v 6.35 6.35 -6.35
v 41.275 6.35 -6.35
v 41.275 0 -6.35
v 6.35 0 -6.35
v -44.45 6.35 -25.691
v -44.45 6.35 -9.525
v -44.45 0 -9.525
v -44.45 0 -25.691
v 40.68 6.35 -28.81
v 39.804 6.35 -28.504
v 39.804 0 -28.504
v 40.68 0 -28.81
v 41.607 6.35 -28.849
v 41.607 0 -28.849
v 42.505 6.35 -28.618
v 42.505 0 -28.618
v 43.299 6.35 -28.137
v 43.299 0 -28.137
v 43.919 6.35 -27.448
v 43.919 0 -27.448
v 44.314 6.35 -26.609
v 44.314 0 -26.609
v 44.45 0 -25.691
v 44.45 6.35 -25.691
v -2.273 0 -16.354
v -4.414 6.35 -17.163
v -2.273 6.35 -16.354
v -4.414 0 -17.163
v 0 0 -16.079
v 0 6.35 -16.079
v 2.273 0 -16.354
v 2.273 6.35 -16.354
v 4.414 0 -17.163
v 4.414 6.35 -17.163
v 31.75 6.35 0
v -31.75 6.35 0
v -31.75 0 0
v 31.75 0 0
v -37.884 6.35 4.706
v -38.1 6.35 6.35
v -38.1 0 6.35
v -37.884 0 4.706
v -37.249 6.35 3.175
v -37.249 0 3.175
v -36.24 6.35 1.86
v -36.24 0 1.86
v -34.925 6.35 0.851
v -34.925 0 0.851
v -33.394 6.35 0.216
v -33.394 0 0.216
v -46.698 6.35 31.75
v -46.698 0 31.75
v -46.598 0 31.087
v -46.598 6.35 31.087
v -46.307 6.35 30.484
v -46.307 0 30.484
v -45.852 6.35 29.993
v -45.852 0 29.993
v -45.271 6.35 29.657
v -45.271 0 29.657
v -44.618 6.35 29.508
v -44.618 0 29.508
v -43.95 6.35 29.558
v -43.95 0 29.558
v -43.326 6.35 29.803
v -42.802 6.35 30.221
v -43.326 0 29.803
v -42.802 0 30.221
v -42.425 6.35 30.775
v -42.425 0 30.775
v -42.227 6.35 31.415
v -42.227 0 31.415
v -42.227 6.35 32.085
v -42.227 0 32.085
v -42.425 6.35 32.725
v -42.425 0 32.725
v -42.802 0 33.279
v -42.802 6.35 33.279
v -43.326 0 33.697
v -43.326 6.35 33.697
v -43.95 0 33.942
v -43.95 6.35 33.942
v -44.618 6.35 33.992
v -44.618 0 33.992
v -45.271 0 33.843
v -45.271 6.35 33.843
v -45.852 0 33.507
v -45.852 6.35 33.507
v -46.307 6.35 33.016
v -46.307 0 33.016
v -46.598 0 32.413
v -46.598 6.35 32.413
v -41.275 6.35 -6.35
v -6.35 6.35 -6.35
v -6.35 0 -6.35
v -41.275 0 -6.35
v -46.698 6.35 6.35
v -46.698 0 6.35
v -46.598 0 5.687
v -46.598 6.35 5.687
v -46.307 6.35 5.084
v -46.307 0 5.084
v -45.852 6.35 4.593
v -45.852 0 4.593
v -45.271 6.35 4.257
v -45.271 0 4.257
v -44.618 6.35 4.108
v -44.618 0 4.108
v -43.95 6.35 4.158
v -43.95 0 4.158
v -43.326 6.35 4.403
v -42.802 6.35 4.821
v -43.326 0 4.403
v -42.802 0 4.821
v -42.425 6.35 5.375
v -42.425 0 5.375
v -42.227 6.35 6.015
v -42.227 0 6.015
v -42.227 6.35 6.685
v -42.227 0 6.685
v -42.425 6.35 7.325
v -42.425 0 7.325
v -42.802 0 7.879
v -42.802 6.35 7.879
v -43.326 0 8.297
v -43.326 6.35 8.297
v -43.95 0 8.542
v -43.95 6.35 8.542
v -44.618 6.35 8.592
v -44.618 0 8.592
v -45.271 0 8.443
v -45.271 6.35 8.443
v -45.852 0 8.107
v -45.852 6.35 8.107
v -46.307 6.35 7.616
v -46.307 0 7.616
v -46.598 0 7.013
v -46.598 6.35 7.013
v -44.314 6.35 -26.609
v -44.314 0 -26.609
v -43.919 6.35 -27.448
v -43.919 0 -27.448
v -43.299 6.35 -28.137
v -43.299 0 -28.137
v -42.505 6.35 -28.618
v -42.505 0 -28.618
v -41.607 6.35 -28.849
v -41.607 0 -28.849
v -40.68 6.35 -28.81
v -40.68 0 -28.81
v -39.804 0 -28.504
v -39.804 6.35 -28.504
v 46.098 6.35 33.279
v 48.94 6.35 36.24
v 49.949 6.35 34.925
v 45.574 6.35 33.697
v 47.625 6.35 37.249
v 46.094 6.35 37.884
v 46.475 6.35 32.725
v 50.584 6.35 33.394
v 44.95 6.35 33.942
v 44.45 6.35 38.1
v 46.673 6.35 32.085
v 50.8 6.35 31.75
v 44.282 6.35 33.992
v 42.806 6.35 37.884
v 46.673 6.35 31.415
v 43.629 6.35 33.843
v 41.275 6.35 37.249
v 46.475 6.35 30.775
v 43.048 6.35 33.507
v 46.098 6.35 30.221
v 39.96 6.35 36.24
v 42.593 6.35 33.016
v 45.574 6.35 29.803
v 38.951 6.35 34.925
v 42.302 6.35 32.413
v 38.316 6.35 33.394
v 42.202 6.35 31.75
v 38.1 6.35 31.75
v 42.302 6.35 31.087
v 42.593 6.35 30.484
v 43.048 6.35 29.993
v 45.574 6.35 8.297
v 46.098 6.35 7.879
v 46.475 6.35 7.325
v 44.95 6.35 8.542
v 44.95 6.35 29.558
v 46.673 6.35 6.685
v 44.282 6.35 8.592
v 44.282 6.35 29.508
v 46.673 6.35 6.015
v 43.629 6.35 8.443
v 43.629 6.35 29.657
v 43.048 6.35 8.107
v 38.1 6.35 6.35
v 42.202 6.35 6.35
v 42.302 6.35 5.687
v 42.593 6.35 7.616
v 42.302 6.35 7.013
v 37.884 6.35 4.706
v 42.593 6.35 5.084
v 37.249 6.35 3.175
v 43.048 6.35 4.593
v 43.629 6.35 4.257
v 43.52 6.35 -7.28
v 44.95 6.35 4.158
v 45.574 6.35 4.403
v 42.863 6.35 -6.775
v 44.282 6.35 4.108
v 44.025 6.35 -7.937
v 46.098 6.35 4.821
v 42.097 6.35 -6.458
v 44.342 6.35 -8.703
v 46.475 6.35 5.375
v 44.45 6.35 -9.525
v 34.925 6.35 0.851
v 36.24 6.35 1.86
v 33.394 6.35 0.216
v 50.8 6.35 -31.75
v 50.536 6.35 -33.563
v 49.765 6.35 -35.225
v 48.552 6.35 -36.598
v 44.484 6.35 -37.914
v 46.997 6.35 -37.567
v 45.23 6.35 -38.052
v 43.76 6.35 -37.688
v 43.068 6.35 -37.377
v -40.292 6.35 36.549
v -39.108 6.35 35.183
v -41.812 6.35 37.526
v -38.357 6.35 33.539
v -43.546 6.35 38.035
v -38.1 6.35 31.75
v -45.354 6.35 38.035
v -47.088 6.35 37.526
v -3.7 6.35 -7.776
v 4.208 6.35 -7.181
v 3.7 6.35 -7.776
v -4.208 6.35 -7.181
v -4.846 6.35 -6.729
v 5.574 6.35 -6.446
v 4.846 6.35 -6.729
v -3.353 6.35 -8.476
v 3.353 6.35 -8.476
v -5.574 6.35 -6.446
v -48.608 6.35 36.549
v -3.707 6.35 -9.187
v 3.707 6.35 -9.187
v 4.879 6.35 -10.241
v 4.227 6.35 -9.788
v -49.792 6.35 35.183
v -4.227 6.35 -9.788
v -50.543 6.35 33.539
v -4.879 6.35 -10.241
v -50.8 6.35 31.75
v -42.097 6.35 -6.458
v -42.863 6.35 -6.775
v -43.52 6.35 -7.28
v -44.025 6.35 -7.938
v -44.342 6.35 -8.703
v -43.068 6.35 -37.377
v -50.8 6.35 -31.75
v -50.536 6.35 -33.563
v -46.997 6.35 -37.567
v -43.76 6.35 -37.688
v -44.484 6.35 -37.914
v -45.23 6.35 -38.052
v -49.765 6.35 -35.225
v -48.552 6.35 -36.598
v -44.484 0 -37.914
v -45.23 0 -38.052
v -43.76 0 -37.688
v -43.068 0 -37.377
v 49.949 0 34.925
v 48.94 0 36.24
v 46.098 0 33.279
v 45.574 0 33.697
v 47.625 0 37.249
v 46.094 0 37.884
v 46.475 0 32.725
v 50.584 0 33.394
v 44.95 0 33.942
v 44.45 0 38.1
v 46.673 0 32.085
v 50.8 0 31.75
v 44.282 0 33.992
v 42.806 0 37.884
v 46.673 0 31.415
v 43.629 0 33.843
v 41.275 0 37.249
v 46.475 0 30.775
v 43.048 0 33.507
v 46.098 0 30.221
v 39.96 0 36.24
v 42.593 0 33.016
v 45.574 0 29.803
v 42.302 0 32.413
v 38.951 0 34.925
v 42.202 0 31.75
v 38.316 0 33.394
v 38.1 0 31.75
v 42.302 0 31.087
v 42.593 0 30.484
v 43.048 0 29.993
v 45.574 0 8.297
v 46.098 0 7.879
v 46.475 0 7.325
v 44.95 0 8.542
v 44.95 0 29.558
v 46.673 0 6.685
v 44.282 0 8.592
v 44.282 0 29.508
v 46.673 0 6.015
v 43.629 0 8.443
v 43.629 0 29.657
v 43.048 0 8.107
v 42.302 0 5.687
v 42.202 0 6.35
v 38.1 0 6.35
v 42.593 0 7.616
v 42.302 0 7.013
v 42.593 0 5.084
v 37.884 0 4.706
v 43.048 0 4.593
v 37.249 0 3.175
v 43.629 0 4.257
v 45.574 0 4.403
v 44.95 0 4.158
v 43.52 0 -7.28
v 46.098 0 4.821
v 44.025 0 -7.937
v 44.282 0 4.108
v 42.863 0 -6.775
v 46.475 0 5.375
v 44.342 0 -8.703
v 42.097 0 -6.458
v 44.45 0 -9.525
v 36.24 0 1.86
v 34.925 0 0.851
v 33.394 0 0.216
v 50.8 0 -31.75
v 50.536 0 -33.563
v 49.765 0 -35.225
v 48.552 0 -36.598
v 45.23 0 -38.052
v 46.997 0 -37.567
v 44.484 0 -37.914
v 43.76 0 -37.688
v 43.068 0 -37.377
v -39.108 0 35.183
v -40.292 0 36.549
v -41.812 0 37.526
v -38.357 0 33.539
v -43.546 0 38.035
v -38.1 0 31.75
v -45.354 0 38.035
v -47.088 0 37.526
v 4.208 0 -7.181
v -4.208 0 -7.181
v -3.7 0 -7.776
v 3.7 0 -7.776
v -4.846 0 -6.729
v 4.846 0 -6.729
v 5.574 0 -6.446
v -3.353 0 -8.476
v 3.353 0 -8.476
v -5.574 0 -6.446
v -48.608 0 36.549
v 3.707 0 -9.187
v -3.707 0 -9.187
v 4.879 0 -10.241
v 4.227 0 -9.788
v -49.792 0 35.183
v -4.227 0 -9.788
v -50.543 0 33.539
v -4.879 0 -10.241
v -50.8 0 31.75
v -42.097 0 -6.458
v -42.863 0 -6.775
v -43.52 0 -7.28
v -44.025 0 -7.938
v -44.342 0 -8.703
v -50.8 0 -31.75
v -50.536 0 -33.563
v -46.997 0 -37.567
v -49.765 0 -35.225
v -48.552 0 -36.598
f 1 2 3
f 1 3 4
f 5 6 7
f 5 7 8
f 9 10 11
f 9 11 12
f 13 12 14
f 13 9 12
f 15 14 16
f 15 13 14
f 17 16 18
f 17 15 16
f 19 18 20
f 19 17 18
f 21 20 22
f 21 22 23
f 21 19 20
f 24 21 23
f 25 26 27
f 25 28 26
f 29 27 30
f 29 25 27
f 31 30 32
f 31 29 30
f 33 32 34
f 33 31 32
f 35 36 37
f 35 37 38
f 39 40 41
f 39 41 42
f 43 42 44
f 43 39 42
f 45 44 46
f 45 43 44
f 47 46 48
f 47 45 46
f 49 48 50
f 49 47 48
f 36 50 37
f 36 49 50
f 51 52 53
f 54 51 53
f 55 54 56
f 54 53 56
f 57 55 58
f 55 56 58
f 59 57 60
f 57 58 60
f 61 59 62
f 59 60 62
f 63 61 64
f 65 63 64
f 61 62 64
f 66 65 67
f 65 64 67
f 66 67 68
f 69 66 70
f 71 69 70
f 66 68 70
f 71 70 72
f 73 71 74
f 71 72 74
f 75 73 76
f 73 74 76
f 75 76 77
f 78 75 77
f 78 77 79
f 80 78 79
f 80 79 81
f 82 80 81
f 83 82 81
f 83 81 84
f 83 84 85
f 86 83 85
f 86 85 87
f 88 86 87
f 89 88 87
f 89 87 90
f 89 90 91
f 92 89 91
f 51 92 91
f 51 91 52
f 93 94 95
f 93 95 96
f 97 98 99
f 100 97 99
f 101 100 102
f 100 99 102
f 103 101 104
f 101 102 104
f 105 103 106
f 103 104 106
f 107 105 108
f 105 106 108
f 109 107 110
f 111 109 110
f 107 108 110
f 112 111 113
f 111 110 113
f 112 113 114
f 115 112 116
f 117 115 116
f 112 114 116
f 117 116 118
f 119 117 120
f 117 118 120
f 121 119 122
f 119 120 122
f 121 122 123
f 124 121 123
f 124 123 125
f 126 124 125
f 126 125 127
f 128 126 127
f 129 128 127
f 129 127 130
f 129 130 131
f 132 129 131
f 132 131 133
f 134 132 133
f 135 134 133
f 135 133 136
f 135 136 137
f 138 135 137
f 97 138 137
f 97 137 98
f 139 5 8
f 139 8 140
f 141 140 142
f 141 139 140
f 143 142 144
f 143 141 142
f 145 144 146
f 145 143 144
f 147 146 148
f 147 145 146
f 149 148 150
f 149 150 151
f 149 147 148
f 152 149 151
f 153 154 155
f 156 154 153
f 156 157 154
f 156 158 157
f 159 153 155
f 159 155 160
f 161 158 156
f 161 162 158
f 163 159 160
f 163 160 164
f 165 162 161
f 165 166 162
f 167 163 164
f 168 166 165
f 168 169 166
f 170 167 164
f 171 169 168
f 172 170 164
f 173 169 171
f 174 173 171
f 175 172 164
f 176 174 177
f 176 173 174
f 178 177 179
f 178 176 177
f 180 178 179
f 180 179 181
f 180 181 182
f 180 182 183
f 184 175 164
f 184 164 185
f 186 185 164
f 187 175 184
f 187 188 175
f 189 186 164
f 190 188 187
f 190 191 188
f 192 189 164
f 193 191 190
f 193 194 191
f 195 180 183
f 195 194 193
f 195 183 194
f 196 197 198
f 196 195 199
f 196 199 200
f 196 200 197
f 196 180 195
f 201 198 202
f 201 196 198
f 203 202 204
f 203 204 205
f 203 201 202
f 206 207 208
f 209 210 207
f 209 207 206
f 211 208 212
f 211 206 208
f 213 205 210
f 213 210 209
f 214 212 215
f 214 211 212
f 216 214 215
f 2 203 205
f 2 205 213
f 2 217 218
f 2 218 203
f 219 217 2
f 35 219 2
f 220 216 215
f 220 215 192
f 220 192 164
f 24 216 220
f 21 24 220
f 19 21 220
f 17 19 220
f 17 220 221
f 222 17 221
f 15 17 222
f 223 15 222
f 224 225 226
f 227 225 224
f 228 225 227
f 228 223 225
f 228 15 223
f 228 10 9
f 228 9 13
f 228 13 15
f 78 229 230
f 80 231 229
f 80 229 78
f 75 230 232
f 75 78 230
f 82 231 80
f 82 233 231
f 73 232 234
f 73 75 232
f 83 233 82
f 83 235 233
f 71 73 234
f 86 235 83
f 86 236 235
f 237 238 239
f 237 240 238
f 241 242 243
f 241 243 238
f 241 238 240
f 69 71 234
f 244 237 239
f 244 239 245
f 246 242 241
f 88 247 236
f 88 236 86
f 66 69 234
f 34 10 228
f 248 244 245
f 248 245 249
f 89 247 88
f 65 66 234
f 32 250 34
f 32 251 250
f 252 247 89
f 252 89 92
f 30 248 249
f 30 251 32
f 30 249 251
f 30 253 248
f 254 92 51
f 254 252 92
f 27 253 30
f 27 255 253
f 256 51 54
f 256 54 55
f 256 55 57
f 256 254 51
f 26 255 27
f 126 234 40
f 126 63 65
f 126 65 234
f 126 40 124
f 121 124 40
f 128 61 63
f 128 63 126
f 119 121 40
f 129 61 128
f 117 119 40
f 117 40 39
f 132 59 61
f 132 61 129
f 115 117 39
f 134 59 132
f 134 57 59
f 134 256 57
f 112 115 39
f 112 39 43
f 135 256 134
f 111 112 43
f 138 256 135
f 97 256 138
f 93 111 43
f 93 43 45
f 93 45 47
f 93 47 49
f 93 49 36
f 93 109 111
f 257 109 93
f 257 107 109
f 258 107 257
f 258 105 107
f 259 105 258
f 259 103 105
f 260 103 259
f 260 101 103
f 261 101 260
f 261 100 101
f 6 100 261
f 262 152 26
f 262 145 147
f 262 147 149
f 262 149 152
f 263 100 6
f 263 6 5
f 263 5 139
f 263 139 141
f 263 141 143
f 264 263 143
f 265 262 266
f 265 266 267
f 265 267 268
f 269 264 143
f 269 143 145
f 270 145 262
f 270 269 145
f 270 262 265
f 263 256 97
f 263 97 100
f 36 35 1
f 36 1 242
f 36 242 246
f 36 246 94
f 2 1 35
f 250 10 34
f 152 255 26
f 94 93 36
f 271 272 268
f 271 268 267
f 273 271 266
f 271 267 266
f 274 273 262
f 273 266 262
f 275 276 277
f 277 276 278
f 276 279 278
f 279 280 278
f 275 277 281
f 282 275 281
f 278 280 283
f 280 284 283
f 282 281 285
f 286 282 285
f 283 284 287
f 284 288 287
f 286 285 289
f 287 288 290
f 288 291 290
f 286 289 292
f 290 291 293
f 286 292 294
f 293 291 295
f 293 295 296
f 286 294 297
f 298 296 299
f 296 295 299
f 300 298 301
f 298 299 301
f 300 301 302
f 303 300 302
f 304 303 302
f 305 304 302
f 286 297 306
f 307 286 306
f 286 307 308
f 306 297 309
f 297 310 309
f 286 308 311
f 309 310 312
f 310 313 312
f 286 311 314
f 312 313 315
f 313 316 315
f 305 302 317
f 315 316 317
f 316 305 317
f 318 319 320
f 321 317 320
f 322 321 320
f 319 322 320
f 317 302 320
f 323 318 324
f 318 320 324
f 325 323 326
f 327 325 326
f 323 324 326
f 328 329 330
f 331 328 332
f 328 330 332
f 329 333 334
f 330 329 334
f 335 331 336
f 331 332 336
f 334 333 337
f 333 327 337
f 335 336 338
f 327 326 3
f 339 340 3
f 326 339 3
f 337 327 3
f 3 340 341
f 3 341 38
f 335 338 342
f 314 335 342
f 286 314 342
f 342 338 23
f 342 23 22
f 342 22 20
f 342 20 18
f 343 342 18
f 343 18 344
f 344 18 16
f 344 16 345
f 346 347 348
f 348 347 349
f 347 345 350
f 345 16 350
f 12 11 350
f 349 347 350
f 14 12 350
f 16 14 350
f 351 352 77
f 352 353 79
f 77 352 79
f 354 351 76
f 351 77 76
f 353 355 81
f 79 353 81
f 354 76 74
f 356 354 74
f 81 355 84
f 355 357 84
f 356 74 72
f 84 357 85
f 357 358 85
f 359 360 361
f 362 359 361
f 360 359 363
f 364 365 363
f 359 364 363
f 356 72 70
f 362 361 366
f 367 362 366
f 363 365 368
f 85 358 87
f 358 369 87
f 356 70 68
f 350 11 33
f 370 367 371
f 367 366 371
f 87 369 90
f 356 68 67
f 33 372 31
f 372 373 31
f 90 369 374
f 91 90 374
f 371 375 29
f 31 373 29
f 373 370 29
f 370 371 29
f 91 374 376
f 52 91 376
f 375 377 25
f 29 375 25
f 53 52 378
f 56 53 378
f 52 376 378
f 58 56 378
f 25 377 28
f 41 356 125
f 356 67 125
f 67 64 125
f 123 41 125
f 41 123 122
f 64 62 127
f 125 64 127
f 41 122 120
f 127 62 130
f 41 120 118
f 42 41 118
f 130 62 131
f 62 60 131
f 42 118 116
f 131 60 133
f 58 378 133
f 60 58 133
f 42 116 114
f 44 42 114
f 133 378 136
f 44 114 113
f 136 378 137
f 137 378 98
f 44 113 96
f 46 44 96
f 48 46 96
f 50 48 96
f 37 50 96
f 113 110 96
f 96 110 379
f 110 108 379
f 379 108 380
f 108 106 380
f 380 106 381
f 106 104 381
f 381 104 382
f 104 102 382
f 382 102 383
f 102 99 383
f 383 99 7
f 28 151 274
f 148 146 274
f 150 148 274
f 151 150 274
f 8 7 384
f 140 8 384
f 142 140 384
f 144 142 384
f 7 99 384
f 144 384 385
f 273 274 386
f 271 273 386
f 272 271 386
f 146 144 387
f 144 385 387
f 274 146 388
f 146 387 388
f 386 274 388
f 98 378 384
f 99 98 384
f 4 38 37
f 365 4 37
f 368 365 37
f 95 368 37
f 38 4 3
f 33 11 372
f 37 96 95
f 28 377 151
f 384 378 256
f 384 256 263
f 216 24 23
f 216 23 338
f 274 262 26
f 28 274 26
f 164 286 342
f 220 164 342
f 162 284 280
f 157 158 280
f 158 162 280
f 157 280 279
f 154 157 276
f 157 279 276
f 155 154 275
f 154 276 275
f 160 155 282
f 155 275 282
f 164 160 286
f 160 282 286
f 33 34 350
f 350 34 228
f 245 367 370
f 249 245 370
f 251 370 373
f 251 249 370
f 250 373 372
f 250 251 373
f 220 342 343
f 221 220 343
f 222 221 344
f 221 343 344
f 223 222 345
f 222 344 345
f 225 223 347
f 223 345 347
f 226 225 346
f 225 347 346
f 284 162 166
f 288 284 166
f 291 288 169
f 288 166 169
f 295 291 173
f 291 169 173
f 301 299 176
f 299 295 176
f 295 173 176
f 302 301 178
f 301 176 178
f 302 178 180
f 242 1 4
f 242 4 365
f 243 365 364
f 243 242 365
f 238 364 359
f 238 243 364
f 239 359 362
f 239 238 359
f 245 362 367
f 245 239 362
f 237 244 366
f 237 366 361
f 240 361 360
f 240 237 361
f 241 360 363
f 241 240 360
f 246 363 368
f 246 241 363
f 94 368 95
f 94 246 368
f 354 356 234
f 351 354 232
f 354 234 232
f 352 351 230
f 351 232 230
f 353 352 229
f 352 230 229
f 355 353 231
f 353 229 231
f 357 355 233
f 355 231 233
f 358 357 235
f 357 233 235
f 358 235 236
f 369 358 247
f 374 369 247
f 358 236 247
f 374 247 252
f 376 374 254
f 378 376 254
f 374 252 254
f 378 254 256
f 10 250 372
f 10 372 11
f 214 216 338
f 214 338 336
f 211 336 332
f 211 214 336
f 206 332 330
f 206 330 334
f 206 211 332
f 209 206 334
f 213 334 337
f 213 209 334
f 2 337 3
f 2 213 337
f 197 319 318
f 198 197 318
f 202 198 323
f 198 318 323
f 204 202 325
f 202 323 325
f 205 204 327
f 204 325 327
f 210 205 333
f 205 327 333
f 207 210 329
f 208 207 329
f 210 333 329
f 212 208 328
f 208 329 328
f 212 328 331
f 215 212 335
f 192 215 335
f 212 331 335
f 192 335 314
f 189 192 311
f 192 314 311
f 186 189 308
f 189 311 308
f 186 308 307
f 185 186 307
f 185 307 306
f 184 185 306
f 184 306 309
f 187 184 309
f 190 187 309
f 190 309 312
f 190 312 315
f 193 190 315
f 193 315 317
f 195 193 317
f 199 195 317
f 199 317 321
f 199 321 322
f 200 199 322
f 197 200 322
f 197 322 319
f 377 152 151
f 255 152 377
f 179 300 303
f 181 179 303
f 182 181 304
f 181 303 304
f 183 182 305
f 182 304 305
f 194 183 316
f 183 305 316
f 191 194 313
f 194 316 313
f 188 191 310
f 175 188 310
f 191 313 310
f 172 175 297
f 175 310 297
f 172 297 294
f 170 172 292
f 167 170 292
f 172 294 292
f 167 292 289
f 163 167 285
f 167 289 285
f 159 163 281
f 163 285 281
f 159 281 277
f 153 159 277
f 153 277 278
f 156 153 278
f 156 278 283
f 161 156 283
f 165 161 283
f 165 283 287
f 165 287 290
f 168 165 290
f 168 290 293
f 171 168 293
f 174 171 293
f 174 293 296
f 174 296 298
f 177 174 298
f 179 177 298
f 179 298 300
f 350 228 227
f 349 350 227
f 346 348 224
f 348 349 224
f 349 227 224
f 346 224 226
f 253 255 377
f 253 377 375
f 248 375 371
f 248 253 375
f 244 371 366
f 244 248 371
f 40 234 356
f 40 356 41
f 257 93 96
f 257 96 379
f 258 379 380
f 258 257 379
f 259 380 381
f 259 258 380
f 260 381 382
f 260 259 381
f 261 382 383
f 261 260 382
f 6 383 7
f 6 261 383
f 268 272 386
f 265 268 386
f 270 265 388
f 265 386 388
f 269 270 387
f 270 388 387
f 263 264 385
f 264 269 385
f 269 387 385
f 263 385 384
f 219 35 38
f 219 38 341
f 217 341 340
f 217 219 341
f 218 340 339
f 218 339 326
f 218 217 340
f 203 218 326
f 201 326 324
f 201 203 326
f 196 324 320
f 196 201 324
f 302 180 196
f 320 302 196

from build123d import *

# Parameters (mm, degrees)
SKETCH1_W          = 101.6
SKETCH1_H          = 76.2
BASE_DEPTH         = 6.35
TUBE_NOTCH_DEPTH   = 64.816710194
MOUNTING_HOLES_D   = 4.4958
SKETCH8_W          = 76.2
SKETCH8_H          = 38.1
WHEEL_CUTOUT_DEPTH = 64.816710194
FILLET1_R          = 6.35
FILLET2_R          = 9.525
CUT_EXTRUDE1_DEPTH = 64.816710194
FILLET3_R          = 3.175


with BuildPart() as part:
    # Sketch1 → Base (new body)
    with BuildSketch(Plane(origin=(0, 0, 0), x_dir=(1, 0, 0), z_dir=(0, 1, 0))):
        Rectangle(SKETCH1_W, SKETCH1_H)
    extrude(amount=BASE_DEPTH)

    # Sketch2 → Tube notch (cut, through all)
    with BuildSketch(Plane(origin=(0, 6.35, 0), x_dir=(1, 0, 0), z_dir=(0, 1, 0))):
        Polygon((-44.45, 38.1), (0, 14.855181866), (44.45, 38.1), align=None)
    extrude(amount=-TUBE_NOTCH_DEPTH, mode=Mode.SUBTRACT)

    # Mounting holes (through all)
    with Locations(Plane(origin=(0, 6.35, 0), x_dir=(1, 0, 0), z_dir=(0, 1, 0))):
        with Locations((-44.45, -6.35), (-44.45, -31.75), (44.45, -31.75), (44.45, -6.35)):
            Hole(MOUNTING_HOLES_D / 2)

    # Sketch8 → Wheel cutout (cut, through all)
    with BuildSketch(Plane(origin=(0, 6.35, 0), x_dir=(1, 0, 0), z_dir=(0, 1, 0))):
        with Locations((0, -19.05)):
            Rectangle(SKETCH8_W, SKETCH8_H)
    extrude(amount=-WHEEL_CUTOUT_DEPTH, mode=Mode.SUBTRACT)

    # Fillet1
    # the kernel refuses this fillet: 6.35 mm, written as the material it adds along each edge
    with BuildSketch(Plane(origin=(38.1, 6.35, 0), x_dir=(0, 0, 1), z_dir=(0, -1, 0))) as fillet1_piece_1:
        with BuildLine():
            CenterArc((FILLET1_R, FILLET1_R), FILLET1_R, 180, 90)
            Line((0, FILLET1_R), (0, 0))
            Line((0, 0), (FILLET1_R, 0))
        make_face()
    extrude(amount=6.35)
    with BuildSketch(Plane(origin=(-38.1, 6.35, 0), x_dir=(0, 0, 1), z_dir=(0, -1, 0))) as fillet1_piece_2:
        with BuildLine():
            CenterArc((FILLET1_R, -FILLET1_R), FILLET1_R, 90, 90)
            Line((0, -FILLET1_R), (0, 0))
            Line((0, 0), (FILLET1_R, 0))
        make_face()
    extrude(amount=6.35)
    # the kernel refuses this fillet: 6.35 mm, written as the material it takes off along each edge
    with BuildSketch(Plane(origin=(-50.8, -15.875, 38.1), x_dir=(1, 0, 0), z_dir=(0, 1, 0)), Plane(origin=(50.8, -15.875, -38.1), x_dir=(-1, 0, 0), z_dir=(0, 1, 0)), Plane(origin=(50.8, -15.875, 38.1), x_dir=(0, 0, -1), z_dir=(0, 1, 0)), Plane(origin=(-38.1, 22.225, 38.1), x_dir=(-1, 0, 0), z_dir=(0, -1, 0)), Plane(origin=(-50.8, -15.875, -38.1), x_dir=(0, 0, 1), z_dir=(0, 1, 0))) as fillet1_2_piece_1:
        with BuildLine():
            CenterArc((FILLET1_R, FILLET1_R), FILLET1_R, 180, 90)
            Line((0, FILLET1_R), (0, 0))
            Line((0, 0), (FILLET1_R, 0))
        make_face()
    extrude(amount=38.1, mode=Mode.SUBTRACT)
    with BuildSketch(Plane(origin=(-44.45, 10.250302923, -38.1), x_dir=(-1, 0, 0), z_dir=(0, -1, 0)), Plane(origin=(44.45, 10.250302923, -38.1), x_dir=(-0.8861469338573508, 0, 0.46340437159700587), z_dir=(0, -1, 0))) as fillet1_2_piece_2:
        with BuildLine():
            CenterArc((FILLET1_R * 0.245688373095, -FILLET1_R), FILLET1_R, 90, 27.607004509)
            Line((-FILLET1_R * 0.217715998502, -FILLET1_R * 0.113853066143), (0, 0))
            Line((0, 0), (FILLET1_R * 0.245688373095, 0))
        make_face()
    extrude(amount=14.150605846, mode=Mode.SUBTRACT)
    with BuildSketch(Plane(origin=(38.1, 22.225, 38.1), x_dir=(1, 0, 0), z_dir=(0, -1, 0))) as fillet1_2_piece_3:
        with BuildLine():
            CenterArc((FILLET1_R, -FILLET1_R), FILLET1_R, 90, 90)
            Line((0, -FILLET1_R), (0, 0))
            Line((0, 0), (FILLET1_R, 0))
        make_face()
    extrude(amount=38.1, mode=Mode.SUBTRACT)

    # Fillet2
    fillet2_edges = [part.edges().sort_by_distance(p)[0] for p in [
        (0, 3.175, -14.855181866),
    ]]
    fillet(fillet2_edges, radius=FILLET2_R)

    # Sketch9 → Cut-Extrude1 (cut, through all)
    with BuildSketch(Plane(origin=(0, 6.35, 0), x_dir=(1, 0, 0), z_dir=(0, 1, 0))):
        Polygon((-44.45, 6.35), (-44.45, 30.934145493), (-3.175, 9.349671511), (-3.175, 6.35), align=None)
        Polygon((3.175, 9.349671511), (44.45, 30.934145493), (44.45, 6.35), (3.175, 6.35), align=None)
    extrude(amount=-CUT_EXTRUDE1_DEPTH, mode=Mode.SUBTRACT)

    # Fillet3
    # the kernel refuses this fillet: 3.175 mm, written as the material it adds along each edge
    with BuildSketch(Plane(origin=(-44.45, 6.35, -6.35), x_dir=(1, 0, 0), z_dir=(0, -1, 0))) as fillet3_piece_1:
        with BuildLine():
            CenterArc((FILLET3_R, -FILLET3_R), FILLET3_R, 90, 90)
            Line((0, -FILLET3_R), (0, 0))
            Line((0, 0), (FILLET3_R, 0))
        make_face()
    extrude(amount=6.35)
    with BuildSketch(Plane(origin=(-3.175, 6.35, -9.349671511), x_dir=(0, 0, 1), z_dir=(0, -1, 0))) as fillet3_piece_2:
        with BuildLine():
            CenterArc((FILLET3_R * 0.605537984618, FILLET3_R), FILLET3_R, 207.607004509, 62.392995491)
            Line((-FILLET3_R * 0.28060894924, FILLET3_R * 0.536595628403), (0, 0))
            Line((0, 0), (FILLET3_R * 0.605537984618, 0))
        make_face()
    extrude(amount=6.35)
    with BuildSketch(Plane(origin=(-3.175, 6.35, -6.35), x_dir=(-1, 0, 0), z_dir=(0, -1, 0)), Plane(origin=(44.45, 6.35, -6.35), x_dir=(-1, 0, 0), z_dir=(0, -1, 0)), Plane(origin=(3.175, 6.35, -6.35), x_dir=(0, 0, -1), z_dir=(0, -1, 0))) as fillet3_piece_3:
        with BuildLine():
            CenterArc((FILLET3_R, FILLET3_R), FILLET3_R, 180, 90)
            Line((0, FILLET3_R), (0, 0))
            Line((0, 0), (FILLET3_R, 0))
        make_face()
    extrude(amount=6.35)
    with BuildSketch(Plane(origin=(3.175, 6.35, -9.349671511), x_dir=(0, 0, 1), z_dir=(0, -1, 0))) as fillet3_piece_4:
        with BuildLine():
            CenterArc((FILLET3_R * 0.605537984618, -FILLET3_R), FILLET3_R, 90, 62.392995491)
            Line((-FILLET3_R * 0.28060894924, -FILLET3_R * 0.536595628403), (0, 0))
            Line((0, 0), (FILLET3_R * 0.605537984618, 0))
        make_face()
    extrude(amount=6.35)
    with BuildSketch(Plane(origin=(44.45, 6.35, -30.934145493), x_dir=(0, 0, 1), z_dir=(0, -1, 0)), Plane(origin=(-44.45, 6.35, -30.934145493), x_dir=(0.8861469338573508, 0, 0.463404371597006), z_dir=(0, -1, 0))) as fillet3_piece_5:
        with BuildLine():
            CenterArc((FILLET3_R * 1.65142406489, FILLET3_R), FILLET3_R, 152.392995491, 117.607004509)
            Line((FILLET3_R * 0.765277131029, FILLET3_R * 1.4634043716), (0, 0))
            Line((0, 0), (FILLET3_R * 1.65142406489, 0))
        make_face()
    extrude(amount=6.35)


solid = part.part
